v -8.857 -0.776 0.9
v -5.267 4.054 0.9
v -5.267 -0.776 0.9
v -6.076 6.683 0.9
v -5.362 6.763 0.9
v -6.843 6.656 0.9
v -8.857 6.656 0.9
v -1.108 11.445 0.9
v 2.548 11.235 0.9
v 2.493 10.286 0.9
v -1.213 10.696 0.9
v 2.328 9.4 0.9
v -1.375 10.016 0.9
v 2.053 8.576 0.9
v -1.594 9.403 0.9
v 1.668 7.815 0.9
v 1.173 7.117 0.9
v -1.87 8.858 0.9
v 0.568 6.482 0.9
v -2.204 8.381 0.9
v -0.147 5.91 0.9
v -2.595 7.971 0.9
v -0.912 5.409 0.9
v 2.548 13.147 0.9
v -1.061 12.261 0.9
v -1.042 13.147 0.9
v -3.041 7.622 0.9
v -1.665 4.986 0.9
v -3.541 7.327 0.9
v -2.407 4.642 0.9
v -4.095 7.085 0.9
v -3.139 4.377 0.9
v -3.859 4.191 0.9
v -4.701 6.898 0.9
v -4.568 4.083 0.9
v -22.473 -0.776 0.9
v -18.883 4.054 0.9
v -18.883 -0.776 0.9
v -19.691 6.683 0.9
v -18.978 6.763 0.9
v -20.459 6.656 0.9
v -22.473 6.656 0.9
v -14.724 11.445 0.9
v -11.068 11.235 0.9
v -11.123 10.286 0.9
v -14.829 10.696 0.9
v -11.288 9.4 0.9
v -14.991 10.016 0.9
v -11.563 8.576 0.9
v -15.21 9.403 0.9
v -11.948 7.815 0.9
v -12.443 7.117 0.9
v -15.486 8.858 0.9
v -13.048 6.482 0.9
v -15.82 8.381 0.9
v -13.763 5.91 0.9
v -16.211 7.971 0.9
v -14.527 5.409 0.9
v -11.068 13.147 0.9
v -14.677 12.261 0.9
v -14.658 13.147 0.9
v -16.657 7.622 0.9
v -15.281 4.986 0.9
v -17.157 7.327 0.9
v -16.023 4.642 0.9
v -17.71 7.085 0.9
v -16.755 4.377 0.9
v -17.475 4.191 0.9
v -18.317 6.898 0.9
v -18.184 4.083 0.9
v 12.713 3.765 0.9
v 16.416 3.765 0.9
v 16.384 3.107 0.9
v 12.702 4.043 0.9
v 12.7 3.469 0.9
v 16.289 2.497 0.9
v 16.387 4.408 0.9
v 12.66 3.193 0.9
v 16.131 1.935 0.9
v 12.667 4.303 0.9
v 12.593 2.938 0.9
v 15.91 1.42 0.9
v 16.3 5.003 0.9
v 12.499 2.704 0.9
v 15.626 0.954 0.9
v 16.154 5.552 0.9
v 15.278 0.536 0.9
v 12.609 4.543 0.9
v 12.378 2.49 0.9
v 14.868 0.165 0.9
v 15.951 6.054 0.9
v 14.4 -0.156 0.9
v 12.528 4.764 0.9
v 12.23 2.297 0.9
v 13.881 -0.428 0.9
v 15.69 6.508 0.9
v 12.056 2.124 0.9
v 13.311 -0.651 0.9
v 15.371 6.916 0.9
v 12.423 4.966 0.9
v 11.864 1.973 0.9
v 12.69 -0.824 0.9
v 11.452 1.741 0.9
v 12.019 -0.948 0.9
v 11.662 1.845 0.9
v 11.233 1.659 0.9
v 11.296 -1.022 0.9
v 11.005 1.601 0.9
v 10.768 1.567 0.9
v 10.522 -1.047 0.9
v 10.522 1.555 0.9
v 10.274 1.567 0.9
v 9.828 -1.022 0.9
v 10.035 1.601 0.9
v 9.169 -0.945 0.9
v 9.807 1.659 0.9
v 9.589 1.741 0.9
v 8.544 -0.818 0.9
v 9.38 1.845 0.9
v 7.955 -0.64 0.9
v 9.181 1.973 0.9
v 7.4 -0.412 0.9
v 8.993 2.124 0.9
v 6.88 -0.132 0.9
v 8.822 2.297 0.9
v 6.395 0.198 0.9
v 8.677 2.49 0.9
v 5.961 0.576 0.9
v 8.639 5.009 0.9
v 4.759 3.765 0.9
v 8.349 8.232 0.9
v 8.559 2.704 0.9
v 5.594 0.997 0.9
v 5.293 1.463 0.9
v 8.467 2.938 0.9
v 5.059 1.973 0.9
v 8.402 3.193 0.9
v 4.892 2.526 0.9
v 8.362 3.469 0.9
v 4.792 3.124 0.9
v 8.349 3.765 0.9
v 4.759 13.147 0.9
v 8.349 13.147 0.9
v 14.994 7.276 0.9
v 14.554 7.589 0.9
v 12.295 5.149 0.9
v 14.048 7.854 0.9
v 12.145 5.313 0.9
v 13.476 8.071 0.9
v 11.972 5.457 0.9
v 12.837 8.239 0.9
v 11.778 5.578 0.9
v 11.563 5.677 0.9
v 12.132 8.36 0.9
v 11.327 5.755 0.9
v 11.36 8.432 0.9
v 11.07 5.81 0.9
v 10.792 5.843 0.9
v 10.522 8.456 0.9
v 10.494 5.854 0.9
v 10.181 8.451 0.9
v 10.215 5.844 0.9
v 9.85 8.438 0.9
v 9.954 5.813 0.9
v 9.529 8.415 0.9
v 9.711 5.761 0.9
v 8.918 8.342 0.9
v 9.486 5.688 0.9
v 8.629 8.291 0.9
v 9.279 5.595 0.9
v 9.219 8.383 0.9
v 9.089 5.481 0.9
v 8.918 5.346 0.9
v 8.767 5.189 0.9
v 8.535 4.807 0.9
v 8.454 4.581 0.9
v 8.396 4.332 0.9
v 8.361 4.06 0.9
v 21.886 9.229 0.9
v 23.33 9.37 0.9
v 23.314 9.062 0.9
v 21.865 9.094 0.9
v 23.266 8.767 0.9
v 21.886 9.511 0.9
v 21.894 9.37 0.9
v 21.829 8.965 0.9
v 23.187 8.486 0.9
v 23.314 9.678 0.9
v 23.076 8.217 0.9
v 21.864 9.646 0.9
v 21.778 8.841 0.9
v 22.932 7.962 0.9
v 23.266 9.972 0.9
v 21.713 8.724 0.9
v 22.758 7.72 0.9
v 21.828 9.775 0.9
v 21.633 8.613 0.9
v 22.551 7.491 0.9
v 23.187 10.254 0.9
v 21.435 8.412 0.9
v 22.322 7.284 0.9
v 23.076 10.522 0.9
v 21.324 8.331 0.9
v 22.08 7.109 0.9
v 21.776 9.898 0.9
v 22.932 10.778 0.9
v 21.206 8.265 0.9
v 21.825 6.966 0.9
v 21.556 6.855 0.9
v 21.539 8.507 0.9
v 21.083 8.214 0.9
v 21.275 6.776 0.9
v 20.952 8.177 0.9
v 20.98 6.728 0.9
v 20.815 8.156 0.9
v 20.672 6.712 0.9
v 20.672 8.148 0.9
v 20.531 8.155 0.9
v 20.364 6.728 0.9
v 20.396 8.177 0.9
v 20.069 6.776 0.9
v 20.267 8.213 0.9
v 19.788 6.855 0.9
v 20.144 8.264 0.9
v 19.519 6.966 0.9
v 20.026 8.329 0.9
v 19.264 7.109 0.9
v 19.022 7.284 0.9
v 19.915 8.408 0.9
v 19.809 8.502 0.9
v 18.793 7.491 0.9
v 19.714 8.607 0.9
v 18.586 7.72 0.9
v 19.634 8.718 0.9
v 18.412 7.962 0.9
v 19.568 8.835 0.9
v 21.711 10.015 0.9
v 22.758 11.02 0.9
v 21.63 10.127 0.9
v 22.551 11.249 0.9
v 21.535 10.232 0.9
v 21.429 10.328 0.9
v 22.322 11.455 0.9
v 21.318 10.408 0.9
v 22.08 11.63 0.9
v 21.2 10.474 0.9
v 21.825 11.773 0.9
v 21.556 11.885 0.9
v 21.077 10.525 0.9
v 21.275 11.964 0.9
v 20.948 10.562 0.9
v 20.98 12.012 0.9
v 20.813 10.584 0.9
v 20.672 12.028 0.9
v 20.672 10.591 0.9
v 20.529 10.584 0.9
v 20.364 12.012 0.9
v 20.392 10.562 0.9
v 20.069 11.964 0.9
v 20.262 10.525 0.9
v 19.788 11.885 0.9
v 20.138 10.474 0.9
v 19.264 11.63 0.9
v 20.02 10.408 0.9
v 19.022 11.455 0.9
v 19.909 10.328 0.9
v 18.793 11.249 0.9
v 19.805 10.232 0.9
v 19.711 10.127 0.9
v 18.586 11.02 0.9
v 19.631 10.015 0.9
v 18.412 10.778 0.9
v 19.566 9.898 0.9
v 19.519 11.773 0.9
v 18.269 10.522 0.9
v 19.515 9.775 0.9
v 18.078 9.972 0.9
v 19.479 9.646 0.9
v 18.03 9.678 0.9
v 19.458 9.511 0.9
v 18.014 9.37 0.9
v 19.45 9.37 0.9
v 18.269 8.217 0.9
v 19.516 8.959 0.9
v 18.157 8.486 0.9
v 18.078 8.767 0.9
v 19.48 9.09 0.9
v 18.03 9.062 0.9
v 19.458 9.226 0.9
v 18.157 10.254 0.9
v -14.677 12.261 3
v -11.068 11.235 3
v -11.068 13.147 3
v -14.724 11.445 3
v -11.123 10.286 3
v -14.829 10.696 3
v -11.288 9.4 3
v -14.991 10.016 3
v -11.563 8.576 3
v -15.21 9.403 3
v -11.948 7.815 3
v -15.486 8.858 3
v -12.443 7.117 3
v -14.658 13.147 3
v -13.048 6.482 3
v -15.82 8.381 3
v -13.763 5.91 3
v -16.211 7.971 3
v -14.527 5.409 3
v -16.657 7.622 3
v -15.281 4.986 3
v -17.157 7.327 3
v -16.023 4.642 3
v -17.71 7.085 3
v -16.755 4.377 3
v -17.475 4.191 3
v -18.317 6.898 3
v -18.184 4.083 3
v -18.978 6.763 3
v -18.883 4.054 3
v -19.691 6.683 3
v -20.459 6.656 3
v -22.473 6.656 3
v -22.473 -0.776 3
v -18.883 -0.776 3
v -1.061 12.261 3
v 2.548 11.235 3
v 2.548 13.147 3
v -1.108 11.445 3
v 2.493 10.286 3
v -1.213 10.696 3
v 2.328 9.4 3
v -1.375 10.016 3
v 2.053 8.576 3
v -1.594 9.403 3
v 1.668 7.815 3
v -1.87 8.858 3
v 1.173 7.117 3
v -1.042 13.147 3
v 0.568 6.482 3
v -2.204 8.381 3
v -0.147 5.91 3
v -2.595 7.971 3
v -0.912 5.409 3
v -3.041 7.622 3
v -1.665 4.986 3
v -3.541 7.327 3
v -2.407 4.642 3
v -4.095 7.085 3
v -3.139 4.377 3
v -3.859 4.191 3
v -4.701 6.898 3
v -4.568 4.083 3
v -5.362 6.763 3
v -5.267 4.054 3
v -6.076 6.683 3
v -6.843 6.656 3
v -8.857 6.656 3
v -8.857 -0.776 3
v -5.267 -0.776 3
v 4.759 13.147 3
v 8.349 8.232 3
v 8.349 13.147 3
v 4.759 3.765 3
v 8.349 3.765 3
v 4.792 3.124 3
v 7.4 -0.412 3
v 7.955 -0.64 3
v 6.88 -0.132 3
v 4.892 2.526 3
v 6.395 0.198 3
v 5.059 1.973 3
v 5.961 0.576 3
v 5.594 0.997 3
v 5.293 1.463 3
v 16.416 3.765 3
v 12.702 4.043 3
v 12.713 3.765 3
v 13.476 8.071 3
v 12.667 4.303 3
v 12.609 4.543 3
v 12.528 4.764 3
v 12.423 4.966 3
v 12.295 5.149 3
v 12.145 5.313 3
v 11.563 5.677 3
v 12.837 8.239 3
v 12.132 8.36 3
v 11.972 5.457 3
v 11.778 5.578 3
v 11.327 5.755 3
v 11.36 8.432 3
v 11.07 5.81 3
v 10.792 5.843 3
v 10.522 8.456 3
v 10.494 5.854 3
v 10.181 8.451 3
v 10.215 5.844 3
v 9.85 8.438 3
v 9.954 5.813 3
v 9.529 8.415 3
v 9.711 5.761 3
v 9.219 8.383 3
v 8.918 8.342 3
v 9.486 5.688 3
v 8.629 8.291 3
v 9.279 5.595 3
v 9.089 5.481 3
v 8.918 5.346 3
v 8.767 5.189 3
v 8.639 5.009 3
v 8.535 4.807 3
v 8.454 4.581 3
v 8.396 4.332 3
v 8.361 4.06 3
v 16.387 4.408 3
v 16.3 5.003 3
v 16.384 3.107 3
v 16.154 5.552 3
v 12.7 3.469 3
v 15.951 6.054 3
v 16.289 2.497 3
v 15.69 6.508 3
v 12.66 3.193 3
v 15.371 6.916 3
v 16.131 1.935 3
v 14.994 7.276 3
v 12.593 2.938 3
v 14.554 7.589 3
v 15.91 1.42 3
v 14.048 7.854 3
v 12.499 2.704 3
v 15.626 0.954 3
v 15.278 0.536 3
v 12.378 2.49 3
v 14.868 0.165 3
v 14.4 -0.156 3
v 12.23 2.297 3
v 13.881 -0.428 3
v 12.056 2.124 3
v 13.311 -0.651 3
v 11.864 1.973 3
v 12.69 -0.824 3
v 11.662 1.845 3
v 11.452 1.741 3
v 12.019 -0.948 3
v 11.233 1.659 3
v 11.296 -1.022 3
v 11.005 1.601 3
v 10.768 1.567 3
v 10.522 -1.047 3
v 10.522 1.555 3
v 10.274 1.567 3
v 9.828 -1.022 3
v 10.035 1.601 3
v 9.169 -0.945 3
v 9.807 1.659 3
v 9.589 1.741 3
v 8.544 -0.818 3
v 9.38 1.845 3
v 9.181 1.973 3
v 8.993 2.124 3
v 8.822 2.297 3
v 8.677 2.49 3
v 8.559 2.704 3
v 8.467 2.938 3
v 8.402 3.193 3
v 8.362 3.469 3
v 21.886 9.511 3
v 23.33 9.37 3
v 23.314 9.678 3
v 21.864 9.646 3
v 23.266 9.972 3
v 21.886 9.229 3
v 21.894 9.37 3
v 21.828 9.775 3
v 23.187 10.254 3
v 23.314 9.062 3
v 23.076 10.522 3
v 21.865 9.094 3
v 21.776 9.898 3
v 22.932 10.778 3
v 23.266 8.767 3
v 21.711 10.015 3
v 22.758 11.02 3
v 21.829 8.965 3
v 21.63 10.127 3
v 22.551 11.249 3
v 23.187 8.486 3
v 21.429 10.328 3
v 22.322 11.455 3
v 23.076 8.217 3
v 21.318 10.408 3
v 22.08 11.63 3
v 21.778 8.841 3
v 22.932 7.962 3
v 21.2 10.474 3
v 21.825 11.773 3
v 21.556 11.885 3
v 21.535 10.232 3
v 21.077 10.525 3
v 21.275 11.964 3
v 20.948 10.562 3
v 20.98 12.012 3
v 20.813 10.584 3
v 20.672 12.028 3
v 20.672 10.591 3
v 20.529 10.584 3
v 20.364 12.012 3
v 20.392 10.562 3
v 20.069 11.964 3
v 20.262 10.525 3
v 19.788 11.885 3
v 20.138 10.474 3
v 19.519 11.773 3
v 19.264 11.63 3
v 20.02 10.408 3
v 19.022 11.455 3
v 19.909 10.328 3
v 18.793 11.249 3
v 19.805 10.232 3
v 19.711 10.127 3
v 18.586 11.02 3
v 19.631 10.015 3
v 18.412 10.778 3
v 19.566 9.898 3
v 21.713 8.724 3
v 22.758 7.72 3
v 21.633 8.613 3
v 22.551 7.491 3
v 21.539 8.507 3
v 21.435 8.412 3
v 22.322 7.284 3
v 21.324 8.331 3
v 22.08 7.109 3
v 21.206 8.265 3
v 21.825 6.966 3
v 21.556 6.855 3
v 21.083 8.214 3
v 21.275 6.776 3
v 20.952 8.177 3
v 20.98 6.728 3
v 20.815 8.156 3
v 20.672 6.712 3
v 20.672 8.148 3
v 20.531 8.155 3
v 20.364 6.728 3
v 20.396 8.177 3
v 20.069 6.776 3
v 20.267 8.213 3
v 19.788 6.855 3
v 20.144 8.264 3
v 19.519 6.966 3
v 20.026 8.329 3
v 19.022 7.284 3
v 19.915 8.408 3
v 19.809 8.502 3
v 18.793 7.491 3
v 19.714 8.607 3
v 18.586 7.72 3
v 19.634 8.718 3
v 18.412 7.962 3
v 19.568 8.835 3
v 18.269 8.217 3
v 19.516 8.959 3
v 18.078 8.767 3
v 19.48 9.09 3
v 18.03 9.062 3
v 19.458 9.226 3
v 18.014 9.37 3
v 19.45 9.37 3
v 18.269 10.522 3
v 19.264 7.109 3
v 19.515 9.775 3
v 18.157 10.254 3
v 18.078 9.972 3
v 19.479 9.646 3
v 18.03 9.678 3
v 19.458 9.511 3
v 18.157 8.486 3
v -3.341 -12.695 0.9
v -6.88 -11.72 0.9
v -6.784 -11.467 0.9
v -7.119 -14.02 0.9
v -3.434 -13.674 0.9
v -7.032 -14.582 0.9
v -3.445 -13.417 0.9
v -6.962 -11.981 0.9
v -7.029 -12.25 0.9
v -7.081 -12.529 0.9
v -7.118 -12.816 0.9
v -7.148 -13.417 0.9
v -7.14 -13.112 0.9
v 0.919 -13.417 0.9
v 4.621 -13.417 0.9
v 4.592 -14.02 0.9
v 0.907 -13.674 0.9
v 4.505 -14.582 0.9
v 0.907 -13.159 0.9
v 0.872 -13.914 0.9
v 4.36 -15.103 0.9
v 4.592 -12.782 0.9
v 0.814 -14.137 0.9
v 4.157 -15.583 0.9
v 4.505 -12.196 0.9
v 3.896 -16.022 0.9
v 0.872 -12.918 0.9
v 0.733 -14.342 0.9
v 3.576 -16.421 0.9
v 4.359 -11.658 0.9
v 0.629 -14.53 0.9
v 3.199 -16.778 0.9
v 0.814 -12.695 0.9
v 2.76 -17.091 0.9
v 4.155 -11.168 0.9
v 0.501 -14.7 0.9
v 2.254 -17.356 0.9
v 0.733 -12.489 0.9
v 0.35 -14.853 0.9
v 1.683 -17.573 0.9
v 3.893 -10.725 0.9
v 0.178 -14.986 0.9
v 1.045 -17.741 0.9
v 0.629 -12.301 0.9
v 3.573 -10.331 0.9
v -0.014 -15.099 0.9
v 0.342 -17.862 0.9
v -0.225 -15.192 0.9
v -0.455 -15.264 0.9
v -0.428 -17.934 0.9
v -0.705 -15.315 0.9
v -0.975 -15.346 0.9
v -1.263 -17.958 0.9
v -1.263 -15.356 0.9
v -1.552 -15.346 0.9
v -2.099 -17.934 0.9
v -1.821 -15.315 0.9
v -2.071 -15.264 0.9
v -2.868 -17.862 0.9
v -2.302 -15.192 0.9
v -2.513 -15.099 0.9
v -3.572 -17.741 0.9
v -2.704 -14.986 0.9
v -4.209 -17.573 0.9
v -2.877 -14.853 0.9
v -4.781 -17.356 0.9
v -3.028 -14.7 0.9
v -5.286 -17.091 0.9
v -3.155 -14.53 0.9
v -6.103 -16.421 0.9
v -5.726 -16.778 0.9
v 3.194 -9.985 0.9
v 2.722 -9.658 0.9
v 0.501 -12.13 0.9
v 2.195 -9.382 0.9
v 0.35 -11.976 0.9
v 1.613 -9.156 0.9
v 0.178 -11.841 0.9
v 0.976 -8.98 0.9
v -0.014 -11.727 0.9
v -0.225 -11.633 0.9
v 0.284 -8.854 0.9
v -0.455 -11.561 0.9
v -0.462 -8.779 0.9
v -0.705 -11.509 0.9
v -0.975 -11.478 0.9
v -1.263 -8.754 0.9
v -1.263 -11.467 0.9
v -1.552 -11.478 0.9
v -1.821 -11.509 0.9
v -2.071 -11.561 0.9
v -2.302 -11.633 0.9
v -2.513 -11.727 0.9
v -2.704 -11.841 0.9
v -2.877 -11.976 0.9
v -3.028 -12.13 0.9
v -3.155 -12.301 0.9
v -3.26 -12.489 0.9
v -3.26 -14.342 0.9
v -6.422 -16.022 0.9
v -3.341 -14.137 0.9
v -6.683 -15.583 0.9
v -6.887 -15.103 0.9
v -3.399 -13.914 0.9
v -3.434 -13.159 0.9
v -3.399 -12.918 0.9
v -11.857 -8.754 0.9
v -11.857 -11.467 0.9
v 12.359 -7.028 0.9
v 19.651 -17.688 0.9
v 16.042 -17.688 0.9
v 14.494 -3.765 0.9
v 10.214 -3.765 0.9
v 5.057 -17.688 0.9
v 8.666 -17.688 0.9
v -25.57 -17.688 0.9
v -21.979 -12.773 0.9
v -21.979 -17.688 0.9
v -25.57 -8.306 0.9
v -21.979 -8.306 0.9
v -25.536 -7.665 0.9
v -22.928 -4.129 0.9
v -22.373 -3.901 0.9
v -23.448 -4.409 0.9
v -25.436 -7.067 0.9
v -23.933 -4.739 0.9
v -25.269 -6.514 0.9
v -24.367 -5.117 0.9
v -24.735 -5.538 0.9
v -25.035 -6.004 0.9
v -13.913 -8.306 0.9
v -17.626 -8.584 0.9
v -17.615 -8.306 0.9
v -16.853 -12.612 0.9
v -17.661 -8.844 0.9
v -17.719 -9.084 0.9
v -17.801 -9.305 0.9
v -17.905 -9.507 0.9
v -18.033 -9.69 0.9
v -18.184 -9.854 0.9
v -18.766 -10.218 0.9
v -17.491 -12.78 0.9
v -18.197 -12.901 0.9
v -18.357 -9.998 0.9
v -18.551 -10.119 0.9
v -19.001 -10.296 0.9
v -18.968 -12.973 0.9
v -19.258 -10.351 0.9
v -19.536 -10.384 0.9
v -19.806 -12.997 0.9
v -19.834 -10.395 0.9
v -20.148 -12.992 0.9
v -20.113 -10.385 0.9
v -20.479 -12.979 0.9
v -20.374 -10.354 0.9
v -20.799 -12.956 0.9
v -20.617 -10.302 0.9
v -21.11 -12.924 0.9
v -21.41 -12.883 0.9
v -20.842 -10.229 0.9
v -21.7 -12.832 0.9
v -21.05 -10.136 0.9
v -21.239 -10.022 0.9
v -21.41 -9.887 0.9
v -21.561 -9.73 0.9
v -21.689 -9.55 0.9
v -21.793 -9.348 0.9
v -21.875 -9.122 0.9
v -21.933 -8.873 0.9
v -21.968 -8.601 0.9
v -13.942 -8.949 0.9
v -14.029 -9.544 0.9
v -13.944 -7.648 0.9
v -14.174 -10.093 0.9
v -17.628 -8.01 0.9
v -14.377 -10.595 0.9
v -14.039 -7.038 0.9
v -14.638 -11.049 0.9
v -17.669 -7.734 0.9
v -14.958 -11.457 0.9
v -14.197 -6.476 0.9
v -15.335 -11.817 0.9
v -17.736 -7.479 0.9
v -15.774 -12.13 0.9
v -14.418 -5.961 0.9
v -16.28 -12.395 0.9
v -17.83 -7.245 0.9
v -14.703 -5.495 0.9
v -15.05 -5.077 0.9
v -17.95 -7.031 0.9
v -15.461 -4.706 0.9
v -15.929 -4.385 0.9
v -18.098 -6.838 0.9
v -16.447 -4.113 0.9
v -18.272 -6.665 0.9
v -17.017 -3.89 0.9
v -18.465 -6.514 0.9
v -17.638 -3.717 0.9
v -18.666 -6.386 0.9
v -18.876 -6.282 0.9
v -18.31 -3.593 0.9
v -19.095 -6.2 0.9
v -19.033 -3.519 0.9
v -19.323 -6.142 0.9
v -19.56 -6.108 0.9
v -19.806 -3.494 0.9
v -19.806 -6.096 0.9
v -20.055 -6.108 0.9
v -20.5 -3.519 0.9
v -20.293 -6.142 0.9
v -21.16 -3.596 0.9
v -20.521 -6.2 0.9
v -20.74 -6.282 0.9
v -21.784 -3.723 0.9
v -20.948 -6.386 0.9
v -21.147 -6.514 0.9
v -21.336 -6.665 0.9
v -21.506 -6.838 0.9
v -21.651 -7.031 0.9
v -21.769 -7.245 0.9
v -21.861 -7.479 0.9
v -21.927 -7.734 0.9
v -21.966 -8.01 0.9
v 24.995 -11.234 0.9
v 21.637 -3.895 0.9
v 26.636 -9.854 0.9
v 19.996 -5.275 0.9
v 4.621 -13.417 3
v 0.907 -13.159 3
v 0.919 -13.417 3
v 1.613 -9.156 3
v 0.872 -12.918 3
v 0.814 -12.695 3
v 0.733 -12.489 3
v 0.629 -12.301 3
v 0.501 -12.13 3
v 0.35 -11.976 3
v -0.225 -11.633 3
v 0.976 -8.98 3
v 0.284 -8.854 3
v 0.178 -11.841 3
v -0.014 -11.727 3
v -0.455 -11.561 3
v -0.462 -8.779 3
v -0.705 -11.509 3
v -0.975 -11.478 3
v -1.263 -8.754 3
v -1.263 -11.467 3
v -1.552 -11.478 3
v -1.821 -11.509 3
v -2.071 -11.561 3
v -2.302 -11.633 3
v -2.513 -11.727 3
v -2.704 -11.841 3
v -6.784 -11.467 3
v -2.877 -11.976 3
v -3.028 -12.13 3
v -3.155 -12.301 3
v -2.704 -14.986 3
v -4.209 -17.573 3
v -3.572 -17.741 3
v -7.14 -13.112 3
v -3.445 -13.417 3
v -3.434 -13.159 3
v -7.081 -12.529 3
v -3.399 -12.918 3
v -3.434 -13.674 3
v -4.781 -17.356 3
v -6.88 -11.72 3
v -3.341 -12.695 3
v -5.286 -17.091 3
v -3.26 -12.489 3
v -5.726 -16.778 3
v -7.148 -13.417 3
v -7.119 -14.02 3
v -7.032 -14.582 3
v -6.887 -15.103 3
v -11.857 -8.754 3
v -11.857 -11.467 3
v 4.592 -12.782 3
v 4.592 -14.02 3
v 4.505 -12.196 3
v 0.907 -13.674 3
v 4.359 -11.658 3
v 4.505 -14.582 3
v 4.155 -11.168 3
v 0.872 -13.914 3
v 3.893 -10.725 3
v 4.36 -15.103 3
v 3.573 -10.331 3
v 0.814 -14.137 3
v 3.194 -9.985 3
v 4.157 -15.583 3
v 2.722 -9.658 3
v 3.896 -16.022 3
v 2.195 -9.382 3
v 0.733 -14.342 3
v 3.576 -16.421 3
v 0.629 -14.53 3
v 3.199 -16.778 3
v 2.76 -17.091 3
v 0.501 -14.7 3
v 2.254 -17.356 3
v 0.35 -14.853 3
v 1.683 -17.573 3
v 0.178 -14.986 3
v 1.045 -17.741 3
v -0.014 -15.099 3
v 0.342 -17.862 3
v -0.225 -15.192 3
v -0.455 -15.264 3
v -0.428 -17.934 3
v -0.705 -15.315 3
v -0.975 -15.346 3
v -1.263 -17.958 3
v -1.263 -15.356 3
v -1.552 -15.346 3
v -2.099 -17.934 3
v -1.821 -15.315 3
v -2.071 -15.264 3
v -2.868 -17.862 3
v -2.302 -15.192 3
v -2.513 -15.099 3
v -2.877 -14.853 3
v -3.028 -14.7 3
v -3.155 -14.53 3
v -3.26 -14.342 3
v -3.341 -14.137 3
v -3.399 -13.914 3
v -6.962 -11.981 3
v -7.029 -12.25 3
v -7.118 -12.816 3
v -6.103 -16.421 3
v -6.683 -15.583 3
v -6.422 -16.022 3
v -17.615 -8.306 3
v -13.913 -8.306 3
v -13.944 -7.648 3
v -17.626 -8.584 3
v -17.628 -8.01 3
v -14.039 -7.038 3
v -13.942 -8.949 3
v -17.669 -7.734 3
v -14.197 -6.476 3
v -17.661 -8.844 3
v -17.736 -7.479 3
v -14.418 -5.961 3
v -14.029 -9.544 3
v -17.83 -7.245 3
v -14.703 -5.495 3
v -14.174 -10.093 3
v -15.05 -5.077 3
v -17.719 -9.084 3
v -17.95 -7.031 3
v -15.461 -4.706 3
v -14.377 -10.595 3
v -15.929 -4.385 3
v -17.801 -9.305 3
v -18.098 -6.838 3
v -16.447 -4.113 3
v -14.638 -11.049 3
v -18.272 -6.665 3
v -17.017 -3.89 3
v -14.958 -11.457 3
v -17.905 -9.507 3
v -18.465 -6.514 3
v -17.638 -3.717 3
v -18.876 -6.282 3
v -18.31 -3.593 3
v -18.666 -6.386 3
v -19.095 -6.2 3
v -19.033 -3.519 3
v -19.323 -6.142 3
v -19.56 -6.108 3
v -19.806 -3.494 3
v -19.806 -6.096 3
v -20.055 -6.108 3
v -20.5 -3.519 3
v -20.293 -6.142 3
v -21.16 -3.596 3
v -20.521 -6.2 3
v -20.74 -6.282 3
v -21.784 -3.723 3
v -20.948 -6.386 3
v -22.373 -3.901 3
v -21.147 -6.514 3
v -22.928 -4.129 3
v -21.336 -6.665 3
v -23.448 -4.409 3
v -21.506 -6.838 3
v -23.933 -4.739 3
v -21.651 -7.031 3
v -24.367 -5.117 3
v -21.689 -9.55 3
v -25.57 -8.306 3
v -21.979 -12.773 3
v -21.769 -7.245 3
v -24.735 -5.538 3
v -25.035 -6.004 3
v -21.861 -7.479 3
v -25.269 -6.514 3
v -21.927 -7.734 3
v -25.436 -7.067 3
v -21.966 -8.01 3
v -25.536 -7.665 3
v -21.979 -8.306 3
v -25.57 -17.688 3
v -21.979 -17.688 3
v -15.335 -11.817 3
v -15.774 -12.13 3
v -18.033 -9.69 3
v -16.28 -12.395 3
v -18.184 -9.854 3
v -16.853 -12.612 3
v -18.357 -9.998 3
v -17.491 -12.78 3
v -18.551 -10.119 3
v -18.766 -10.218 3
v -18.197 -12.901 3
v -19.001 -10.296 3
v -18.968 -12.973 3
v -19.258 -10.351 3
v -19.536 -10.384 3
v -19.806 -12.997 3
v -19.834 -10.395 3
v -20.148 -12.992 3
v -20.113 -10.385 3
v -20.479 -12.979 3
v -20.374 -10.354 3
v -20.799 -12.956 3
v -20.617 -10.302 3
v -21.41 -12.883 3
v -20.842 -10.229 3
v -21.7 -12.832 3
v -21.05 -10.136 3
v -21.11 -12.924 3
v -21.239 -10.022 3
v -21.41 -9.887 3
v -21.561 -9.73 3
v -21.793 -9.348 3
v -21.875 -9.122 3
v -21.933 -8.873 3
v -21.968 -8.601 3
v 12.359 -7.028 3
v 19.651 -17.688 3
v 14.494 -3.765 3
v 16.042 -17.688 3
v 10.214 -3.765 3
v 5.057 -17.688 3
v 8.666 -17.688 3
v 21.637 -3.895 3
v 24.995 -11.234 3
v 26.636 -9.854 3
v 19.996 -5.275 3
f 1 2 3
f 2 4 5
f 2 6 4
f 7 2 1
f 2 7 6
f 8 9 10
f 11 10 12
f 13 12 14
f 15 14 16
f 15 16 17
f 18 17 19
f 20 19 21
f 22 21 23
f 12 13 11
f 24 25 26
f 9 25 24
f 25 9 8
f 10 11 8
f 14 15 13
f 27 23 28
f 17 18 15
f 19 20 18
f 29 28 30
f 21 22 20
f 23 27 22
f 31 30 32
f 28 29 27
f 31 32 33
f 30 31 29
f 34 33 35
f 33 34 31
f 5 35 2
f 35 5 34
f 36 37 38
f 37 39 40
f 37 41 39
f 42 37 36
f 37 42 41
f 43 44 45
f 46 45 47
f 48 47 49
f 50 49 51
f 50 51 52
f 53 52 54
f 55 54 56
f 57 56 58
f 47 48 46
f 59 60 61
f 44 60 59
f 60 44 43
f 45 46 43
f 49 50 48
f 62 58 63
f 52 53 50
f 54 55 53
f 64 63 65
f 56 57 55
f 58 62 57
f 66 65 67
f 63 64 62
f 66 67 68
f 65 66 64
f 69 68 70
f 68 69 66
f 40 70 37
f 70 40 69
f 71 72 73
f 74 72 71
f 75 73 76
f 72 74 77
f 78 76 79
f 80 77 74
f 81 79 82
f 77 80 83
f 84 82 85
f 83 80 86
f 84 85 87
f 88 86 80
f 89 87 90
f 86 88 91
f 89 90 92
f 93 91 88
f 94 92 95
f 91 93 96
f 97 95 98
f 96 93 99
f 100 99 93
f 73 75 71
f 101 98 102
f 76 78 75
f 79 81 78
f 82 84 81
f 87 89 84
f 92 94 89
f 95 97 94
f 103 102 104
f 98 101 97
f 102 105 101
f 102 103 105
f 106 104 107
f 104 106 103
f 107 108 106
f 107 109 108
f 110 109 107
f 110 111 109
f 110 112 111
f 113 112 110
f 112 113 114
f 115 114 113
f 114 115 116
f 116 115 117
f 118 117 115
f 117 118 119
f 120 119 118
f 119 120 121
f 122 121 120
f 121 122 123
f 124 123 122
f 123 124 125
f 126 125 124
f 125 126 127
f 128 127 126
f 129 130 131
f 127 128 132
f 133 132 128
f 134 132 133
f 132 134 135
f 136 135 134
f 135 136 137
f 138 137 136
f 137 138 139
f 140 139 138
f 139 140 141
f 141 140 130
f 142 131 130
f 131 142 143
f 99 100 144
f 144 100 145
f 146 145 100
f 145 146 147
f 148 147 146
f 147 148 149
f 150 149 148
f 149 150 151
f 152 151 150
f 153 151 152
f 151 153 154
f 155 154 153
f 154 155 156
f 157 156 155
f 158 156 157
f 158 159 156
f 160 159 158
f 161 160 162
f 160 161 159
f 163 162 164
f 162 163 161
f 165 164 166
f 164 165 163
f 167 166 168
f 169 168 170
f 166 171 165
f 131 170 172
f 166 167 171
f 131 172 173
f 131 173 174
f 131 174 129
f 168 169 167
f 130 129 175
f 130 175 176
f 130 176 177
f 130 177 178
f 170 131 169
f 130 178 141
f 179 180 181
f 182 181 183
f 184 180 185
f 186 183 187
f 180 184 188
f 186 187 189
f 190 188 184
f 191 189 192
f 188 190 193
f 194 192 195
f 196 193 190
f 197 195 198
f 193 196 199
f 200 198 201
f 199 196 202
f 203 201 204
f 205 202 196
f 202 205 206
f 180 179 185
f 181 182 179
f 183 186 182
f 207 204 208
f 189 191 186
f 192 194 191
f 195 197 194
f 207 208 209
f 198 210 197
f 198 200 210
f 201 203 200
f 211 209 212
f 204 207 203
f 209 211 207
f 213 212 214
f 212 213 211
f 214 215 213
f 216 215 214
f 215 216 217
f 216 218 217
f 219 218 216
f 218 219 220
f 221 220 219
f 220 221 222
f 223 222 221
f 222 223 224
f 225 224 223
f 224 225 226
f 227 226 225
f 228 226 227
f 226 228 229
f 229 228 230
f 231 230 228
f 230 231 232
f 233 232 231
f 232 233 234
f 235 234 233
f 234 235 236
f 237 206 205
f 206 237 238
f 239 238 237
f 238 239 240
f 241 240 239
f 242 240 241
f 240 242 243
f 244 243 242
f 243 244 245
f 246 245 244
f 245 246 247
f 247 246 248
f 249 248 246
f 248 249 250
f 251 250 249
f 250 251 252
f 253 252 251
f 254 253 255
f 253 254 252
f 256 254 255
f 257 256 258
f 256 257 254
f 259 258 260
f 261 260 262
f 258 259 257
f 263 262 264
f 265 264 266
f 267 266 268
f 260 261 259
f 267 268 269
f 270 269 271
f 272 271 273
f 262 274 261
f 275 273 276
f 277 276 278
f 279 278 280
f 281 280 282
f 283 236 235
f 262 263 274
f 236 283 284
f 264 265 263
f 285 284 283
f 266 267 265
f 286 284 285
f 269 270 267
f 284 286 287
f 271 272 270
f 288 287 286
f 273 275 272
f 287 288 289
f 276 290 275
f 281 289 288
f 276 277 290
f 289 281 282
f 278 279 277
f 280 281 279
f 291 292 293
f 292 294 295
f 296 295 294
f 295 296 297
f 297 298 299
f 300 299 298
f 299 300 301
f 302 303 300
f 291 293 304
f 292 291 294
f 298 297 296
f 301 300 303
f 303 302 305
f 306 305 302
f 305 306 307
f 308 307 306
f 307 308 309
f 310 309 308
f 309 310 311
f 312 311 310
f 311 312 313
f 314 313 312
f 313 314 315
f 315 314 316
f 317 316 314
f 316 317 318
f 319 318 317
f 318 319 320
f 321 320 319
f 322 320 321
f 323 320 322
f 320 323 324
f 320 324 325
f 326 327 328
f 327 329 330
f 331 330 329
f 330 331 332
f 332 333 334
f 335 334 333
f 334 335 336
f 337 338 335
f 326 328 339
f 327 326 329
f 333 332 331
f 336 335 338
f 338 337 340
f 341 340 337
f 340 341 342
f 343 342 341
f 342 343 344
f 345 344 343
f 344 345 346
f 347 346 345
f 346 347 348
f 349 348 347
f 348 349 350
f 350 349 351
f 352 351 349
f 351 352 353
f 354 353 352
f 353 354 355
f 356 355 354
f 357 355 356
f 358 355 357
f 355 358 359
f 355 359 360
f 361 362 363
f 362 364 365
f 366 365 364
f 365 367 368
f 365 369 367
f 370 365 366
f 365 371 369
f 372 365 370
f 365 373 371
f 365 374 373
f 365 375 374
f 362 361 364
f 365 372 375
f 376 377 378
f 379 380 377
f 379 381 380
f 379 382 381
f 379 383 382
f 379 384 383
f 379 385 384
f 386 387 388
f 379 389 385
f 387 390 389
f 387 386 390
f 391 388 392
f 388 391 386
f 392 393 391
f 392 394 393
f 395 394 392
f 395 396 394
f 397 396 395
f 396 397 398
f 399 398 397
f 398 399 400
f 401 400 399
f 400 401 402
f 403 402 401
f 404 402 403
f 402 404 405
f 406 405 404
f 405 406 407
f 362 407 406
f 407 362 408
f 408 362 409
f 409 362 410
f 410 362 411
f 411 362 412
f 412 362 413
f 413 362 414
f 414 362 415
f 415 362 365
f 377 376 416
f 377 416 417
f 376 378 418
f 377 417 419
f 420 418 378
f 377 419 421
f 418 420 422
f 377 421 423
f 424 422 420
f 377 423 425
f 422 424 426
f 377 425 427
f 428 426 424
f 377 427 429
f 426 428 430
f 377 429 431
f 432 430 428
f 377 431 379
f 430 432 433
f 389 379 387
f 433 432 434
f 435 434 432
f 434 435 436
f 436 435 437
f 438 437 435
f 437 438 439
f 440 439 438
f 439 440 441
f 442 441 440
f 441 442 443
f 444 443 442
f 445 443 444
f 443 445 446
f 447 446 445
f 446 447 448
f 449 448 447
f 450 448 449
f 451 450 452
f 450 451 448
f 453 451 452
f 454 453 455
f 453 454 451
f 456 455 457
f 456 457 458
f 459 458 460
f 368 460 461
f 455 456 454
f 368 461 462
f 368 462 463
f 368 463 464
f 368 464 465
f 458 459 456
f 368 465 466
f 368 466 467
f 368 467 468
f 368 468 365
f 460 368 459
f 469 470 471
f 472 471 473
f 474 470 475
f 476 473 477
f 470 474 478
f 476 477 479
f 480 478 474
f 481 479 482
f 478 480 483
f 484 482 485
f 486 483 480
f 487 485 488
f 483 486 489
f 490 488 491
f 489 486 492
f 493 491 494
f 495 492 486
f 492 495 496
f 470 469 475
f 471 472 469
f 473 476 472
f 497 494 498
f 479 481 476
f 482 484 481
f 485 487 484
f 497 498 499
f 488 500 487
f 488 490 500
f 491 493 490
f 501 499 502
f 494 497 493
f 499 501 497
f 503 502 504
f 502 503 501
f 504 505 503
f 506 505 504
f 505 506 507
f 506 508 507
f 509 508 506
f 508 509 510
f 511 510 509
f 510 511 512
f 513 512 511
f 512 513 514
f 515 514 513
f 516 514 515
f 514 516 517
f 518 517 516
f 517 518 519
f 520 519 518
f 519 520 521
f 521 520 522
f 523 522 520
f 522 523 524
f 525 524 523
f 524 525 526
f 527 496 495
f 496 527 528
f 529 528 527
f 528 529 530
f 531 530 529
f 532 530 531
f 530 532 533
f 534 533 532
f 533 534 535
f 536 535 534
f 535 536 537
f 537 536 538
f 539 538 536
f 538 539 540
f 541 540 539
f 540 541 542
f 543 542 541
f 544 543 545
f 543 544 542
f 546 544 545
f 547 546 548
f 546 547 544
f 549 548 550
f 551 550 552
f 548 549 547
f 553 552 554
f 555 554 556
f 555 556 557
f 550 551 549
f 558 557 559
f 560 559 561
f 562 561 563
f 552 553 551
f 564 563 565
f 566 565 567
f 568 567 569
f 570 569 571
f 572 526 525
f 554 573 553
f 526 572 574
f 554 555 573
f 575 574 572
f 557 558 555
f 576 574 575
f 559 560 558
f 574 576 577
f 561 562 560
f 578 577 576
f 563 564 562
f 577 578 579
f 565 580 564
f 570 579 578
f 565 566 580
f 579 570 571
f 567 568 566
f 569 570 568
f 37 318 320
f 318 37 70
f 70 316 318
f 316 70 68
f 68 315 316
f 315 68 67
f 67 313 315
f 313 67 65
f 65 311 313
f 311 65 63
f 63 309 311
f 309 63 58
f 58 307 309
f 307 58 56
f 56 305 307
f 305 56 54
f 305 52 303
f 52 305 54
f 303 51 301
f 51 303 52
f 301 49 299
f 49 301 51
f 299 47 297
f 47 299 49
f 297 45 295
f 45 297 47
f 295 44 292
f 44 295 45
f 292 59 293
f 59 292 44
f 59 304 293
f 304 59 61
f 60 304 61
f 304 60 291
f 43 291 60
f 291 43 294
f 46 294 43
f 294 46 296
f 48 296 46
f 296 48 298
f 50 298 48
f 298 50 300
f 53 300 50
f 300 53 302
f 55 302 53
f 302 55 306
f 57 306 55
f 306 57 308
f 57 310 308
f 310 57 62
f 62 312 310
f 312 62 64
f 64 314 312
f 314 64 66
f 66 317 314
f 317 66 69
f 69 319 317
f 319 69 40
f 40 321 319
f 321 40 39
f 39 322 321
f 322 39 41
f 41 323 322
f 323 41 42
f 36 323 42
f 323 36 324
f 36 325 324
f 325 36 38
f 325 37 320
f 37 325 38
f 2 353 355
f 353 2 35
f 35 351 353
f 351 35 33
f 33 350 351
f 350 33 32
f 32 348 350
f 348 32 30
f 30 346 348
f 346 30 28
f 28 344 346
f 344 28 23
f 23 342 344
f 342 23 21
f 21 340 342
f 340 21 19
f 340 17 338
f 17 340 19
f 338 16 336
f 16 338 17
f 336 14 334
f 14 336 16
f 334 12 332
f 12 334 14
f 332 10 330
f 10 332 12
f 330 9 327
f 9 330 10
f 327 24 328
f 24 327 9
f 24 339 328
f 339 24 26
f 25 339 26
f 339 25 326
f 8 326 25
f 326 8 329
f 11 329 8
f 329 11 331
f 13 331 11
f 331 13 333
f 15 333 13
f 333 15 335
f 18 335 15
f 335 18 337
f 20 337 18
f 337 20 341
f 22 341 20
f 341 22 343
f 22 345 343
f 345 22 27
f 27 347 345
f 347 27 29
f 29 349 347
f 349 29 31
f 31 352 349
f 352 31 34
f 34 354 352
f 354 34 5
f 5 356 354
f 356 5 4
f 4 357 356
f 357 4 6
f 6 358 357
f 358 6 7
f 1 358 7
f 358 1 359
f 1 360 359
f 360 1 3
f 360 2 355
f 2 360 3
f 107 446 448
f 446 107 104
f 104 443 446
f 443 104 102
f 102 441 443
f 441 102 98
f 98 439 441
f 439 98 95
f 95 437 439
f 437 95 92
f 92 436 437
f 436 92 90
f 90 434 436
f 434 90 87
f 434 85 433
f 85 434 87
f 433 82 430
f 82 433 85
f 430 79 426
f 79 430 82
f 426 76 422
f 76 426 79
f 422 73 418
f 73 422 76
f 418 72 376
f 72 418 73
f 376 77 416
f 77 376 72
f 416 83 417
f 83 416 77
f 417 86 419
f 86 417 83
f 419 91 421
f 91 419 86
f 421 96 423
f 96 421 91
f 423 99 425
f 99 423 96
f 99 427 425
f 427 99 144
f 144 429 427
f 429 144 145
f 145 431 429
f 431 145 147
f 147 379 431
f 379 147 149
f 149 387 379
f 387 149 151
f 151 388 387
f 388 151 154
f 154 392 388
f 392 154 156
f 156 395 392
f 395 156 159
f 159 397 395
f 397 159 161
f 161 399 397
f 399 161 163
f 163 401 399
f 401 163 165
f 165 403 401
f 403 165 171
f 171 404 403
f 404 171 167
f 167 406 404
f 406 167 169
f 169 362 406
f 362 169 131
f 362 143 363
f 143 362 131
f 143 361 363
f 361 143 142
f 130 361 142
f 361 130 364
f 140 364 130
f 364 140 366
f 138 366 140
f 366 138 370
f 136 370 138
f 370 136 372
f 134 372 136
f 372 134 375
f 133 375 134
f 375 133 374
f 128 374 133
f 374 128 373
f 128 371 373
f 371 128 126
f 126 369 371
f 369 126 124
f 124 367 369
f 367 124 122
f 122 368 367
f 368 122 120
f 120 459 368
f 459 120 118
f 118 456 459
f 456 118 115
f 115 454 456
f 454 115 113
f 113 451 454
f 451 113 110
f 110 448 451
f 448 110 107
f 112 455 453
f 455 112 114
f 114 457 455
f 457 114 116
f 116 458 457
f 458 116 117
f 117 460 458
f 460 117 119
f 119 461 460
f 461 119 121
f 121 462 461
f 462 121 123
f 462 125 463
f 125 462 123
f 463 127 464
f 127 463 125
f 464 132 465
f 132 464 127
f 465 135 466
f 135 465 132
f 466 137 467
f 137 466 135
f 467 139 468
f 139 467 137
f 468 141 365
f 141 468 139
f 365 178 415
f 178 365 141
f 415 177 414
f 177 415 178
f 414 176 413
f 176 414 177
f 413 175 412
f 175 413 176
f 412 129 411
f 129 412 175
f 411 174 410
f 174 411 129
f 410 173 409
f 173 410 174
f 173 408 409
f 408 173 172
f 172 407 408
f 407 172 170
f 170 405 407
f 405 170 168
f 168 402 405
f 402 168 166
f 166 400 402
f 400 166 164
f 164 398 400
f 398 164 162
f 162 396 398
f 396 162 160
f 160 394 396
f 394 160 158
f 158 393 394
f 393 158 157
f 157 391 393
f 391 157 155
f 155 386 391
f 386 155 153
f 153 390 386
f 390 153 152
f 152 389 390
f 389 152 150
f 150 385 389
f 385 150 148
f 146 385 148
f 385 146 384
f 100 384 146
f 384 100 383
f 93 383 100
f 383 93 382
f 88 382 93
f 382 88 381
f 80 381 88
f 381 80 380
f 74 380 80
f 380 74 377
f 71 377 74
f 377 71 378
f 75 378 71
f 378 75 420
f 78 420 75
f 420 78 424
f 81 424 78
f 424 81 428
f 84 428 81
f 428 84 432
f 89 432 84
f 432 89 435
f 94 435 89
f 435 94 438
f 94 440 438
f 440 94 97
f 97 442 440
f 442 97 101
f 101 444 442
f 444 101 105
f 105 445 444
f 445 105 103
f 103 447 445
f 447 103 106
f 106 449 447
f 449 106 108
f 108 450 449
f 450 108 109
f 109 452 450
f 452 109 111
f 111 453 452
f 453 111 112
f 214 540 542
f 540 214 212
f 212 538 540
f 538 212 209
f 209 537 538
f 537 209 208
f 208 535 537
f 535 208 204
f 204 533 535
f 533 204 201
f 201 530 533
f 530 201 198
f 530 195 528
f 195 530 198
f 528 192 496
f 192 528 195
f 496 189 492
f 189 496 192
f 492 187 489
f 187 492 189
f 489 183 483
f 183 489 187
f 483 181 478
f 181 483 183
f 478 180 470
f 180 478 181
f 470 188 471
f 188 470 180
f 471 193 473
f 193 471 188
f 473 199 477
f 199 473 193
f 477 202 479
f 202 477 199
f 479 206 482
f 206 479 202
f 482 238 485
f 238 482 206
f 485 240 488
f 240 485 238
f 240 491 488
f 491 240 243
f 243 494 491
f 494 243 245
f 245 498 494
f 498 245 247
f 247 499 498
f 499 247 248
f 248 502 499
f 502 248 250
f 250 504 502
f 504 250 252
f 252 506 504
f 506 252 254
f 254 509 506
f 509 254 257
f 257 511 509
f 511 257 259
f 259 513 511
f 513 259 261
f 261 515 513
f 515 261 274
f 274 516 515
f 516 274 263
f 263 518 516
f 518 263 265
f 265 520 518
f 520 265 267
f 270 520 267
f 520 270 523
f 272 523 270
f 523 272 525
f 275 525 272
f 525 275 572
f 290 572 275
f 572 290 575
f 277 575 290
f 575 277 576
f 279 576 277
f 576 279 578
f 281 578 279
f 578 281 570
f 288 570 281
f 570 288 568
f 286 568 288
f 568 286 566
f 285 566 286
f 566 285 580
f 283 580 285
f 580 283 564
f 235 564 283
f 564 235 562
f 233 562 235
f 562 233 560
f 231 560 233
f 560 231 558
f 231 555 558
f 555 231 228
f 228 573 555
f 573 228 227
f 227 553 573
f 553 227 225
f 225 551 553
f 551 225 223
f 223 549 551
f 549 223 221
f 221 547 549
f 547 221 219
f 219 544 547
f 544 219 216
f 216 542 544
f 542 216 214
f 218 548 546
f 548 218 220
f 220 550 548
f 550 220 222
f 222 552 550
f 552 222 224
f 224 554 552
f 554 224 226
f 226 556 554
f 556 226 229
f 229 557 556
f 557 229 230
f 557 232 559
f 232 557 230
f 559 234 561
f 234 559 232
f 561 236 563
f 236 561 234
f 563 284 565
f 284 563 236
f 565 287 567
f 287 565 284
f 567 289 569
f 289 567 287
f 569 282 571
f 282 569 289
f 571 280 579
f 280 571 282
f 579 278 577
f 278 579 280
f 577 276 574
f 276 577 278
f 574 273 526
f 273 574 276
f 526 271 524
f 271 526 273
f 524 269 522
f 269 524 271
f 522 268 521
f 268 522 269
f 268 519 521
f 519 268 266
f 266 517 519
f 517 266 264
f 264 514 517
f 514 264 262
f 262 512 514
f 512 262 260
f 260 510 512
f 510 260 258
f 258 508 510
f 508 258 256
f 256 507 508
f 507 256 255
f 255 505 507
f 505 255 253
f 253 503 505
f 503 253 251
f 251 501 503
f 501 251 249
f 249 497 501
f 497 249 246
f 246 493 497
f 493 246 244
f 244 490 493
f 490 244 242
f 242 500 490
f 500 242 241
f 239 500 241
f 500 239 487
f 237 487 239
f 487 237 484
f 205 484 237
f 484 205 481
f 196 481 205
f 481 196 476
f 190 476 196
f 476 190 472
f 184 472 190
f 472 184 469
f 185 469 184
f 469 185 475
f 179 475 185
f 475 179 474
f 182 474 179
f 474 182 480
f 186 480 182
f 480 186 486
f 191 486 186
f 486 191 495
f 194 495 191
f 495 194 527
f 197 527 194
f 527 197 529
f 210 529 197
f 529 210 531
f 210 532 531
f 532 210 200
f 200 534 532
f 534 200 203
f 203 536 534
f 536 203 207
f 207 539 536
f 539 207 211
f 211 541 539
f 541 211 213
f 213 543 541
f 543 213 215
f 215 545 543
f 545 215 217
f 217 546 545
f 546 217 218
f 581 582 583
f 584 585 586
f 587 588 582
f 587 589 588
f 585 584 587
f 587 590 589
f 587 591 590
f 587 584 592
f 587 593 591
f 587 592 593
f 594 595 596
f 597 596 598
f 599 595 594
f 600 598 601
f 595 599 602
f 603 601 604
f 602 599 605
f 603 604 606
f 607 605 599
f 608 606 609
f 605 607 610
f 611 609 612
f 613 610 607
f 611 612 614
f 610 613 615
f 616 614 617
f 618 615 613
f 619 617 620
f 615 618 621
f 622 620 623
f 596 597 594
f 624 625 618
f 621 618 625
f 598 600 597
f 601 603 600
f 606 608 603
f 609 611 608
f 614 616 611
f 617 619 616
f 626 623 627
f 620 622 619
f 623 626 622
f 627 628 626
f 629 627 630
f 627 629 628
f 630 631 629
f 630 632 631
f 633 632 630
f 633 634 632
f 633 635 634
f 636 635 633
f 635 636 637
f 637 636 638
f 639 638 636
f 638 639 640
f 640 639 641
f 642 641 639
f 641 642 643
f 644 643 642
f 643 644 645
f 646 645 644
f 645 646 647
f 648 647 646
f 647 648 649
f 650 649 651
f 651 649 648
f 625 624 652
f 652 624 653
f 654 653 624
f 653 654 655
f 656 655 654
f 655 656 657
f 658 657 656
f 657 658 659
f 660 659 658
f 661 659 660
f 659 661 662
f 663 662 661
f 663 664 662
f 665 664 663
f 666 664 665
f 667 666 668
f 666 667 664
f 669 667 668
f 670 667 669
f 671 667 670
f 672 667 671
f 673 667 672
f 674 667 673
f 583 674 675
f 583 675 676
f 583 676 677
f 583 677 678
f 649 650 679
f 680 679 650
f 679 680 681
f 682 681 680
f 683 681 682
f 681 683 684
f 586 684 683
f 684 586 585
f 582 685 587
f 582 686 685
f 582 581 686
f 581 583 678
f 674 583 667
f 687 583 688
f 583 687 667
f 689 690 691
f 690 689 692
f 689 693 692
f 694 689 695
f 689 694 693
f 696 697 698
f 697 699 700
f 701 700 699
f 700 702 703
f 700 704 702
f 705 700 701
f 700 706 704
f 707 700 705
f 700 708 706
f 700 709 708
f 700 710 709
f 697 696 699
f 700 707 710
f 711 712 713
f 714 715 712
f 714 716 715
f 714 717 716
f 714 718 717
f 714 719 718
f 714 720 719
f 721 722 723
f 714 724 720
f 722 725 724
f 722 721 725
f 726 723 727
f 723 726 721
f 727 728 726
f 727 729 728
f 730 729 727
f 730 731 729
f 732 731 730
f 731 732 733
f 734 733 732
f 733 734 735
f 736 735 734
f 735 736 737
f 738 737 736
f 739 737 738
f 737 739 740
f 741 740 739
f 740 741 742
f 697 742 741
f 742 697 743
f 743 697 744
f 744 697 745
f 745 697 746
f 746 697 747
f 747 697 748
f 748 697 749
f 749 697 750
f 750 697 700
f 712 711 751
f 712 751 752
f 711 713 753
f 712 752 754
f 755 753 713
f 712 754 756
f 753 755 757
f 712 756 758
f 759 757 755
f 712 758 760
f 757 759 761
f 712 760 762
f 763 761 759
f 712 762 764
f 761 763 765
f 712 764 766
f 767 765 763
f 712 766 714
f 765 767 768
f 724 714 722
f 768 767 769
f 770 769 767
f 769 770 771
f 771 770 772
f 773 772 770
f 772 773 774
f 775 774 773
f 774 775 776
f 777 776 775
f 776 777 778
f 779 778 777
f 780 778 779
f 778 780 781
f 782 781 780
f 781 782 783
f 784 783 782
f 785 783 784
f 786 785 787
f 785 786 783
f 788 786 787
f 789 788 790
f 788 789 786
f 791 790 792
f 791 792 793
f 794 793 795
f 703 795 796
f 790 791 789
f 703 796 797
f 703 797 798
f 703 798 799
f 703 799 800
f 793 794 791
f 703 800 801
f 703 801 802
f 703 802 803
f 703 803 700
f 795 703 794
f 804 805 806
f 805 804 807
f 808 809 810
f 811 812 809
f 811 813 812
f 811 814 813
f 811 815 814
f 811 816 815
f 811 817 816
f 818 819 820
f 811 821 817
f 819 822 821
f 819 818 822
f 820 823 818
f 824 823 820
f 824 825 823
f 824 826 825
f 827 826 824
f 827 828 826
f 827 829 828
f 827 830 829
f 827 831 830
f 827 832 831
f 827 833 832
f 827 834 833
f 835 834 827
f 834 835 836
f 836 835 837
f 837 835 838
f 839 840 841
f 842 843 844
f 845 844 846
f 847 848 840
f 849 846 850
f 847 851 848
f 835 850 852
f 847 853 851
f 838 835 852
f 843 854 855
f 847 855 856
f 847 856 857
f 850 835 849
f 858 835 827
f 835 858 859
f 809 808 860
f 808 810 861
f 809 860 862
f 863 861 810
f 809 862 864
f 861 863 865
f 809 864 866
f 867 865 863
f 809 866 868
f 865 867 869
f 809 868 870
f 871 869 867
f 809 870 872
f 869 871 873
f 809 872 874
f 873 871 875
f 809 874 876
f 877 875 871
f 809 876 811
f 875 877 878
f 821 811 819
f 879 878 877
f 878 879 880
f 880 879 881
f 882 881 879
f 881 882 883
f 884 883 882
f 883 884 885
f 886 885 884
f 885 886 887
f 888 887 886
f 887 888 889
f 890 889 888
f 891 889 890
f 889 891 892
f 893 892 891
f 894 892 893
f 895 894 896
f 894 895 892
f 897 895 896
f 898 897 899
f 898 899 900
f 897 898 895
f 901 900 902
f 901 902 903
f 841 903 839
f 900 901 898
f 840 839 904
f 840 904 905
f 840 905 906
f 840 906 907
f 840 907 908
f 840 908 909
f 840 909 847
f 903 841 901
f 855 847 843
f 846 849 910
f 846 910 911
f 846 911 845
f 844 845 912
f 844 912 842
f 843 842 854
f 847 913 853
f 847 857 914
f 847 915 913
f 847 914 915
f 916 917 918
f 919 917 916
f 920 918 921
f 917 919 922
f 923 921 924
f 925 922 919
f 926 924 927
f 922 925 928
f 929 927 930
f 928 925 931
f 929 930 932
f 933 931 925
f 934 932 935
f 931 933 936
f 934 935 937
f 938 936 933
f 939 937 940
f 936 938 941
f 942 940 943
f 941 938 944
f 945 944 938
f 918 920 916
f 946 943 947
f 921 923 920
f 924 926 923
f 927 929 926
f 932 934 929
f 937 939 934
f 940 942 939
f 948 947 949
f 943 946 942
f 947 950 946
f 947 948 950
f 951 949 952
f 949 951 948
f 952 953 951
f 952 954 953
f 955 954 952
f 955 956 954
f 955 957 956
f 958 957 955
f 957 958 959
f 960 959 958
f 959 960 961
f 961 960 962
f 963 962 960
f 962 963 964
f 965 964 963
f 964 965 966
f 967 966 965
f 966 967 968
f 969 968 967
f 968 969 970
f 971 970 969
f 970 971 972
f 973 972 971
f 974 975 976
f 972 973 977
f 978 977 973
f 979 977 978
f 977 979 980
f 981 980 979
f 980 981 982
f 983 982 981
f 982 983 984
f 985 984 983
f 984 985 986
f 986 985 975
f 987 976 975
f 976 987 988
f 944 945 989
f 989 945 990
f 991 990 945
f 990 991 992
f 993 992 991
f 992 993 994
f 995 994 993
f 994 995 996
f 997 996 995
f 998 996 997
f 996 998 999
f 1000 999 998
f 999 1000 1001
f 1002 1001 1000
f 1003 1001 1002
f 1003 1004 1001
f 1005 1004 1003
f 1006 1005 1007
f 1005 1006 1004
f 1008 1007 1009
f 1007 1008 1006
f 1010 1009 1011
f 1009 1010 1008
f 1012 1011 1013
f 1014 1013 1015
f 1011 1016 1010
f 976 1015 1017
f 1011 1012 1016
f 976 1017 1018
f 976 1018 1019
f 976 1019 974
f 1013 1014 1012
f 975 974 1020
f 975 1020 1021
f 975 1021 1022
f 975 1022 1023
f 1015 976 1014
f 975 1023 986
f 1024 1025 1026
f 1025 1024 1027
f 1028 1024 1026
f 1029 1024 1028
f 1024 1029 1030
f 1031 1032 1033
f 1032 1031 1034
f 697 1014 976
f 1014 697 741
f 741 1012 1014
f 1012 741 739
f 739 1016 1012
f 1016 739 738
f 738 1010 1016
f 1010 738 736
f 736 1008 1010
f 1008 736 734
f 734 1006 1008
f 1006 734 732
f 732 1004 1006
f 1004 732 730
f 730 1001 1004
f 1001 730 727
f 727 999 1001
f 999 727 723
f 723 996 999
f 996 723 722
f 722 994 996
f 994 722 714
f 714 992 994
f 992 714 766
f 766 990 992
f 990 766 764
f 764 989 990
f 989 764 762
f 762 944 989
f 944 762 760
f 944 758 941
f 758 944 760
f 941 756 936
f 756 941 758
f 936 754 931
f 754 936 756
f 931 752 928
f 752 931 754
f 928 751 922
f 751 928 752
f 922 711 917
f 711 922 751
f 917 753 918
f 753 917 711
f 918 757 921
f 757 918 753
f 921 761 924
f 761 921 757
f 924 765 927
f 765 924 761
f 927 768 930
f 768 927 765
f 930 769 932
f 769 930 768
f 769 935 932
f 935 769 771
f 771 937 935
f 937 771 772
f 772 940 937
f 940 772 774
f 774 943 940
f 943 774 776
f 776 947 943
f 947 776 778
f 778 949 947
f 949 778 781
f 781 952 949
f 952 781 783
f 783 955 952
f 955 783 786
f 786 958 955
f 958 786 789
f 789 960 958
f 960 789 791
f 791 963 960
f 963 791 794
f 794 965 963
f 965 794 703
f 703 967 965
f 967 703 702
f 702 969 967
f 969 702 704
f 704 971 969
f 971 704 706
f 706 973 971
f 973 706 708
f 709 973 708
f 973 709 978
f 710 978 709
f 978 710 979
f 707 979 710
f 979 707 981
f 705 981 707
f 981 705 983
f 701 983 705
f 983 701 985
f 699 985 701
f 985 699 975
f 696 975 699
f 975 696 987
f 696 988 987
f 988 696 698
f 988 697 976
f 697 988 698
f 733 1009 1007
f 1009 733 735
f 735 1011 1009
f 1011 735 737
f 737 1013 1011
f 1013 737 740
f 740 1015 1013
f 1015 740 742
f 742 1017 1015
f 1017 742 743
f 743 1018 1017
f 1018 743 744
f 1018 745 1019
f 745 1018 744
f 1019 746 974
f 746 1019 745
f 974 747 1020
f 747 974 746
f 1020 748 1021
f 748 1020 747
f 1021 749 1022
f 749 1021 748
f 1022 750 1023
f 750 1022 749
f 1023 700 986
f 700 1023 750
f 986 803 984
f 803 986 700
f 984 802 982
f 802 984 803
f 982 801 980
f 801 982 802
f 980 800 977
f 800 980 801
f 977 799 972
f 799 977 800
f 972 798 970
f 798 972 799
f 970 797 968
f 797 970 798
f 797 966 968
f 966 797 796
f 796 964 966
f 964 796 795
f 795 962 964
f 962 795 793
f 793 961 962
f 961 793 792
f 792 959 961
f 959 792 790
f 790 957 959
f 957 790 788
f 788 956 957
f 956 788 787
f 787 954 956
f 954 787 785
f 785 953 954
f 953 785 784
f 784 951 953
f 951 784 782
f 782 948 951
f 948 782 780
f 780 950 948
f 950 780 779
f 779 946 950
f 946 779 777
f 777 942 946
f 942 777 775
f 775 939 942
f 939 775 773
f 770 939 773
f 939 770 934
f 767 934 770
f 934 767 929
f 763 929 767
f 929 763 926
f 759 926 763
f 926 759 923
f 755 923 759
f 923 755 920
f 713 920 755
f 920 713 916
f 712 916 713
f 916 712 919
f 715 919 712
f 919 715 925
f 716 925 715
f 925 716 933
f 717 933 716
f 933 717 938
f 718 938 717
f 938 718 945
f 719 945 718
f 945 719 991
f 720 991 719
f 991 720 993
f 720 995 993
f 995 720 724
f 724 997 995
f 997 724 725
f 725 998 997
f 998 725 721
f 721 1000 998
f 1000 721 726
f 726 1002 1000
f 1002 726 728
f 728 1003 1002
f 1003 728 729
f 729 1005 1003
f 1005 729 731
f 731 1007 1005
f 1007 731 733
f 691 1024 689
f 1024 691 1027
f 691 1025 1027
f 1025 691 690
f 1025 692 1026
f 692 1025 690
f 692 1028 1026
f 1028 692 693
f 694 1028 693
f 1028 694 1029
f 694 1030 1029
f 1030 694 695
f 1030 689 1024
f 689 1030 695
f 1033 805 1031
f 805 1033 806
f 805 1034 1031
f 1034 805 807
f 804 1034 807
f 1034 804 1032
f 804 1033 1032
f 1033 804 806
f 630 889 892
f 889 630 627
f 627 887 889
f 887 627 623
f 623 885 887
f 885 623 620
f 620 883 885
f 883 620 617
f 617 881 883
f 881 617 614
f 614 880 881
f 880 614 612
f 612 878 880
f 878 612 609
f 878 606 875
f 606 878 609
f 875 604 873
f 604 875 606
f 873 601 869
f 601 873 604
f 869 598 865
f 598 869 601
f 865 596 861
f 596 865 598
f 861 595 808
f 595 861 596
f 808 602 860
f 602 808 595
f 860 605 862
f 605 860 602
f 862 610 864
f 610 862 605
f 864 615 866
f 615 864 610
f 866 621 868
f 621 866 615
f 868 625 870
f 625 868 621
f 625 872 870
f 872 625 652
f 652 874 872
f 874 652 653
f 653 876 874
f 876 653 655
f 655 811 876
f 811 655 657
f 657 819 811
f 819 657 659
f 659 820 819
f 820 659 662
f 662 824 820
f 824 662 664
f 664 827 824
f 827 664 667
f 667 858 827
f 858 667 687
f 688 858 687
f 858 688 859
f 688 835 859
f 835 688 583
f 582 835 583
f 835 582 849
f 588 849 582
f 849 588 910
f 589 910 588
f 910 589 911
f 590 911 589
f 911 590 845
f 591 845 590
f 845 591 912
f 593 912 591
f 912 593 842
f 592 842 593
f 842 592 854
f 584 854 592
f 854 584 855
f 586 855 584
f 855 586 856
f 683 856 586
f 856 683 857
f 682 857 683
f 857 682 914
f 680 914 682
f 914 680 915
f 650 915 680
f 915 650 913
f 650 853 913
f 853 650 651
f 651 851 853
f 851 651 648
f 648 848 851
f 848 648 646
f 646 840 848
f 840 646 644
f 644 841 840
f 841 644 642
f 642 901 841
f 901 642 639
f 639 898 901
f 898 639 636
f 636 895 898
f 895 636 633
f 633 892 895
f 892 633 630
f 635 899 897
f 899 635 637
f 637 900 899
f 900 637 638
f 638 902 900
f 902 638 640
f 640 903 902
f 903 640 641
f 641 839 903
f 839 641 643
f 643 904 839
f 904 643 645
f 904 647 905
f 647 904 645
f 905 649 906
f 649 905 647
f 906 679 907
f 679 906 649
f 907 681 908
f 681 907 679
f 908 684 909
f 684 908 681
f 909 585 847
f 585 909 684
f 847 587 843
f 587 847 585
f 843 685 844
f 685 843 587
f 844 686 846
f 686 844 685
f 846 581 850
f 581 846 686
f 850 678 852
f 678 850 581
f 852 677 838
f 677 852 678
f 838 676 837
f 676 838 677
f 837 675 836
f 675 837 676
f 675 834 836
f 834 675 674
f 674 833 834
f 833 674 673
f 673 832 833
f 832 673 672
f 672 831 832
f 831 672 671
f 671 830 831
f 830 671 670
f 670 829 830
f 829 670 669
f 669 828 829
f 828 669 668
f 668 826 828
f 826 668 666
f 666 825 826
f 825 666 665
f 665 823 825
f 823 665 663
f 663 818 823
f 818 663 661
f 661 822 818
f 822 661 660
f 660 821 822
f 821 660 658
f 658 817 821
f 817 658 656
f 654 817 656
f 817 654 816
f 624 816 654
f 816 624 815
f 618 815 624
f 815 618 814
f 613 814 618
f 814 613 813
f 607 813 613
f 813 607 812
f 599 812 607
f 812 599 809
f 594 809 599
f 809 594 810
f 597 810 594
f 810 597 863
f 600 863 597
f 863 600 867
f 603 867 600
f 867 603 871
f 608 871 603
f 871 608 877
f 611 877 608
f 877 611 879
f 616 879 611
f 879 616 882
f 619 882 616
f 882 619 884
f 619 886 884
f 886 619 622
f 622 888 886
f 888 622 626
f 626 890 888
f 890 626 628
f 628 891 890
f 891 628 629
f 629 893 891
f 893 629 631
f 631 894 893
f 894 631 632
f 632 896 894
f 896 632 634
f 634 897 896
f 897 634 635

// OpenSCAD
$fn = 48;
  // syllabics (overlaid on icon, tallest)
  translate([0, 5.889, 0.900]) linear_extrude(height=2.100) text("ᓯᓯᑲᐤ", size=13.752, halign="center", valign="center", font="Euphemia UCAS:style=Bold");
  translate([0, -10.889, 0.900]) linear_extrude(height=2.100) text("ᑭᓀᐱᐠ", size=13.752, halign="center", valign="center", font="Euphemia UCAS:style=Bold");
